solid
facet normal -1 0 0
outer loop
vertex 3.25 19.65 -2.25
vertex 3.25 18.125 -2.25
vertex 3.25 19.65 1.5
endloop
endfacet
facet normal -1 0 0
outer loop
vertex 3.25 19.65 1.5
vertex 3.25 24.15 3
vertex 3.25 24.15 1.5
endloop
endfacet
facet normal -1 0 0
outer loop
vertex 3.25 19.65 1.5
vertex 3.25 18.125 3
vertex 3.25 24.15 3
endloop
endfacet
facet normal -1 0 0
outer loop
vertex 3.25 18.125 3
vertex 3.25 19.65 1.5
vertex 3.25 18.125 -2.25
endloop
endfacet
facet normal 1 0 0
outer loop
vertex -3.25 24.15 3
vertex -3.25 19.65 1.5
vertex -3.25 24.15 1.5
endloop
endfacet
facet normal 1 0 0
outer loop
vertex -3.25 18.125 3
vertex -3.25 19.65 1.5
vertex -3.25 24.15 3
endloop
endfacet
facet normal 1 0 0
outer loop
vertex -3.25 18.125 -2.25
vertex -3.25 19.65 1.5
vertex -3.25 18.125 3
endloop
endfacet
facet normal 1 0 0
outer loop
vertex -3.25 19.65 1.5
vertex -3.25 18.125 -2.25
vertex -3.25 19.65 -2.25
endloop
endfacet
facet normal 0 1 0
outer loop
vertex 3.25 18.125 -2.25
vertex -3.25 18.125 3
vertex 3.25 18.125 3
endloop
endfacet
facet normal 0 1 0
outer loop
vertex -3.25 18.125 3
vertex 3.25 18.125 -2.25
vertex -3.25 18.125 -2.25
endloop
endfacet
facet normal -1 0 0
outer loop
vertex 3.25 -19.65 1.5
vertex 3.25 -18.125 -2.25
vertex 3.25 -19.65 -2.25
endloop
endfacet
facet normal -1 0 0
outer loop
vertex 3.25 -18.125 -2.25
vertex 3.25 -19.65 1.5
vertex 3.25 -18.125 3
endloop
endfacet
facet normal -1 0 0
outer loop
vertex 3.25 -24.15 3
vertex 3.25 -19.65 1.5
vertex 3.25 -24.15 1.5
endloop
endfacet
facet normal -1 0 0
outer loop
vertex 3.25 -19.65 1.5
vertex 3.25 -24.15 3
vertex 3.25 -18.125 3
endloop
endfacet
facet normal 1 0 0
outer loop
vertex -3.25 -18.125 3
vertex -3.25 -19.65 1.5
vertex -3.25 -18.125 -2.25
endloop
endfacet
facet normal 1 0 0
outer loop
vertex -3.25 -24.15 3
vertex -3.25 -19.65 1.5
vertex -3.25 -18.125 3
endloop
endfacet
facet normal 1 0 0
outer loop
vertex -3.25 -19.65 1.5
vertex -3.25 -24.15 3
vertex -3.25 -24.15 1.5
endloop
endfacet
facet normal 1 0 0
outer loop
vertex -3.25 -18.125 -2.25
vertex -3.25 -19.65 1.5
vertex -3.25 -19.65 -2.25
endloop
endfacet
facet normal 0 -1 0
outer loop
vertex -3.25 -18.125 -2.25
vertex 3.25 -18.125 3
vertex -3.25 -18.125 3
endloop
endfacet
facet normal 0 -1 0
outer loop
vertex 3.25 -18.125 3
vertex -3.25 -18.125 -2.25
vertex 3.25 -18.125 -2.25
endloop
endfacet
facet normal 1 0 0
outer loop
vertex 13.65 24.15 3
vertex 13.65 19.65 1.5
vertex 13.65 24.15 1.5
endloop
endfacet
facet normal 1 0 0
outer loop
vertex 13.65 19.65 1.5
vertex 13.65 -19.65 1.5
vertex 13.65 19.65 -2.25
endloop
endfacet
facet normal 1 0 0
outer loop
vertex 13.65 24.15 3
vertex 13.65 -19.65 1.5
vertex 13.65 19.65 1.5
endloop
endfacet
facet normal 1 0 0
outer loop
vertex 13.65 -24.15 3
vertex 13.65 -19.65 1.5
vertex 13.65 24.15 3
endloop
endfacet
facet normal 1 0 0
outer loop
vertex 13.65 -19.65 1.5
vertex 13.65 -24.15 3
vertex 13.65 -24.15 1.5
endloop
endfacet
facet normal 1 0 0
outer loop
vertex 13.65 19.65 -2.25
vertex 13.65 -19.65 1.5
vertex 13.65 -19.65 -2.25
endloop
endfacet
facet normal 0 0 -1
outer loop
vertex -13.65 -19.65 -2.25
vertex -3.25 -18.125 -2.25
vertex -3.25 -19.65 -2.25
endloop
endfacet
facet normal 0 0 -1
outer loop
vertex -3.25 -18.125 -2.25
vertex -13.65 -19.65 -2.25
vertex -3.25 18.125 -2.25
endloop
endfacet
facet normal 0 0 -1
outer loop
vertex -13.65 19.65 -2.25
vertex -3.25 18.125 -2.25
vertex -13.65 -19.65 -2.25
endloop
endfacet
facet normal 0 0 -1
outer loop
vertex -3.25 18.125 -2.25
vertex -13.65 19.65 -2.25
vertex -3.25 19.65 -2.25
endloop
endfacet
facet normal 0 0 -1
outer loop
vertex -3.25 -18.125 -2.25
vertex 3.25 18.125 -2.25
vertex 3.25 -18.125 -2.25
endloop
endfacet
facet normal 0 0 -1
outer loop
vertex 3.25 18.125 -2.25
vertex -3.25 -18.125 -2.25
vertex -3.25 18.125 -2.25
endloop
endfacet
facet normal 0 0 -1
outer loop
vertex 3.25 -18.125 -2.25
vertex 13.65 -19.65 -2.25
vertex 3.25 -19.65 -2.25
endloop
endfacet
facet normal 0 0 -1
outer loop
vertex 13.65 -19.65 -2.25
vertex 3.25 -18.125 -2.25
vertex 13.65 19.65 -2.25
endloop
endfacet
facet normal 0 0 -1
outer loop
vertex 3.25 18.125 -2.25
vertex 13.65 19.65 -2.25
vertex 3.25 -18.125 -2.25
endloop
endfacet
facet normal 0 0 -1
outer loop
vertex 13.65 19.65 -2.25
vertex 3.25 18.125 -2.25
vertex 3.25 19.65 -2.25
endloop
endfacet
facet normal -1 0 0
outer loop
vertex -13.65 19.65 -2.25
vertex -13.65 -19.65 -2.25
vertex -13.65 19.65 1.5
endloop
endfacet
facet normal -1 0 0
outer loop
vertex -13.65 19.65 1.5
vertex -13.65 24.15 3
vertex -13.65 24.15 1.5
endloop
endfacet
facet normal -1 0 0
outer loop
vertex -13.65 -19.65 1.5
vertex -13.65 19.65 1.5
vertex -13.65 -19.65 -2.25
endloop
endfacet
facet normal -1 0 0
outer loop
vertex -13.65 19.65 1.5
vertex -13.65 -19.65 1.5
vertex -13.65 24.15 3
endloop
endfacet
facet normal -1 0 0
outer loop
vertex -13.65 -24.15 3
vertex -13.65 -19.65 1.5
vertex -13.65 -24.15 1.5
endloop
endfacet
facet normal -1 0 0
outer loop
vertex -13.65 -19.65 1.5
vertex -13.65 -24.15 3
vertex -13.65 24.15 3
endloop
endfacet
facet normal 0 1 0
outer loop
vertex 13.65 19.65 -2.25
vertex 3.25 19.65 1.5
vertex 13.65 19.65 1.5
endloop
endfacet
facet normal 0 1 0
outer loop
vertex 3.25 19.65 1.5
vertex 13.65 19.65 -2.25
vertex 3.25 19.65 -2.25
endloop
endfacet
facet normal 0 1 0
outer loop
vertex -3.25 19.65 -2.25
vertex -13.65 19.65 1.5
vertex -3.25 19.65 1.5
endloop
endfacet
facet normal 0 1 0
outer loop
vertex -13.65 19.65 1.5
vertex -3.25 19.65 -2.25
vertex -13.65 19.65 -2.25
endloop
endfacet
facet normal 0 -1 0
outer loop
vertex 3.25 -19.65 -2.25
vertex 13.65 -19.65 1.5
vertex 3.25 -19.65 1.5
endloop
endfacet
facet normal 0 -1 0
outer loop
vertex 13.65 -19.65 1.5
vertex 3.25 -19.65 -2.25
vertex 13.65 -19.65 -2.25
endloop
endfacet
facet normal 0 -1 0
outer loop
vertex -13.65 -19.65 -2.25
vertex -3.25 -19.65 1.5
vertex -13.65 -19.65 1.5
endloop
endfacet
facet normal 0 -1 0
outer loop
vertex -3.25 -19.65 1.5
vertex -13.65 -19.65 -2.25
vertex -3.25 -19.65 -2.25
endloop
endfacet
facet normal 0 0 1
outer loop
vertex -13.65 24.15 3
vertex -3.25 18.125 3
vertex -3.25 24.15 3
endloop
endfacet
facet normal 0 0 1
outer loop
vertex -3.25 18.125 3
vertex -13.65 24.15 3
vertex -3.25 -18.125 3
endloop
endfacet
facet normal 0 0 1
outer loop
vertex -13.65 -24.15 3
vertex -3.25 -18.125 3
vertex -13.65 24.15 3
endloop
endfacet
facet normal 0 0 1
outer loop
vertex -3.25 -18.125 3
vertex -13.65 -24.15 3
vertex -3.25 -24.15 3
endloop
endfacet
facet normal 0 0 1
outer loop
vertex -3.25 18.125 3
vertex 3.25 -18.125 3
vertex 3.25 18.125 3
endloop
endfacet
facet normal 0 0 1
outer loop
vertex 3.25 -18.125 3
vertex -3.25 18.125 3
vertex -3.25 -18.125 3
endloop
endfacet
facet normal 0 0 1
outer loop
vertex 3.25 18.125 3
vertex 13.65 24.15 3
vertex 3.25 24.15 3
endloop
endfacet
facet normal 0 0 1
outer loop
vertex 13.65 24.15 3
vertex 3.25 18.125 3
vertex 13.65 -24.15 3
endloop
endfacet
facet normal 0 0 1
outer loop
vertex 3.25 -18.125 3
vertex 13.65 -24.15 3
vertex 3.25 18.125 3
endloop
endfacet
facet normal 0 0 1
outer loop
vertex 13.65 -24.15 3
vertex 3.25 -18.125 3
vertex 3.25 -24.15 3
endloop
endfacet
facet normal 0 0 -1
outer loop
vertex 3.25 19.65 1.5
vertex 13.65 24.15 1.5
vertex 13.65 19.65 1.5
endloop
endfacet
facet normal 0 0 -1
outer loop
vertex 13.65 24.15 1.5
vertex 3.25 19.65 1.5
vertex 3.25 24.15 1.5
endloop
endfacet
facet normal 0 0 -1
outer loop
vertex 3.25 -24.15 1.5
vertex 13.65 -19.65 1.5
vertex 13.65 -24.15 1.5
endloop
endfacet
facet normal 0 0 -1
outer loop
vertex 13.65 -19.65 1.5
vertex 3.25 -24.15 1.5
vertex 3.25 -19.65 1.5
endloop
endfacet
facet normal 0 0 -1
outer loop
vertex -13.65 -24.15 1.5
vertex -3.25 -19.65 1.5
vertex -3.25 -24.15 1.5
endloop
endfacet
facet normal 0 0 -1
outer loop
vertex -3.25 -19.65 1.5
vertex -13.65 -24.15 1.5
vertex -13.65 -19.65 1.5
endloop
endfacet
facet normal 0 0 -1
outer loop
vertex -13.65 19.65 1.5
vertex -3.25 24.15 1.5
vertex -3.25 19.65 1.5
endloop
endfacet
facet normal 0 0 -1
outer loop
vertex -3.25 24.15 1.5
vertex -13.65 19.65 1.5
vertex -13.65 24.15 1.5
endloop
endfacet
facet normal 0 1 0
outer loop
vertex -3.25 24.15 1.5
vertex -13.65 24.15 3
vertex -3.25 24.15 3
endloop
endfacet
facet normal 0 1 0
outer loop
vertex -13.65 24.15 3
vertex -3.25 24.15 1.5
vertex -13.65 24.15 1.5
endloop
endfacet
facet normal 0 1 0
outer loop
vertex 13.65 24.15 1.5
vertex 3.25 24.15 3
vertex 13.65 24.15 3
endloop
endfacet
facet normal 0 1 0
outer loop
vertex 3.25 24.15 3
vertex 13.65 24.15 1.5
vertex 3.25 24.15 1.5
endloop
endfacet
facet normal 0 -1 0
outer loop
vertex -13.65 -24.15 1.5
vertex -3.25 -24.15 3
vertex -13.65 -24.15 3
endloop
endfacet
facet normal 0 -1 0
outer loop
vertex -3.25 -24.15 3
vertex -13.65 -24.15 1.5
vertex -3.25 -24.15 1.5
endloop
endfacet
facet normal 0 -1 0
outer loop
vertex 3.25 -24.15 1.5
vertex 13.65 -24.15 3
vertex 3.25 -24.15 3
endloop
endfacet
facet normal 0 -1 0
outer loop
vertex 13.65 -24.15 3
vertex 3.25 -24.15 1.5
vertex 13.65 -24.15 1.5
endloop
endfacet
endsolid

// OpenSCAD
wall_thick = 4;  

//vars for recep
tab_ratio=0.75;
tab_ratioi=1-tab_ratio;
tab_multi=3;

recep_width = 27.3;
recep_notch_width=6.5;
recep_notch_height=1.5;
recep_height=39.3;
hole_sep=36;
hole_dia=3;
z_fite=0.05;

recep_thick=wall_thick*1.5;

union() {
  difference() {
    cube([recep_width, recep_height,recep_thick*tab_ratio],center=true);
    union() {
      translate([0,recep_height/2-recep_notch_height/2,0]) cube([recep_notch_width, recep_notch_height+z_fite, recep_thick*tab_ratio+z_fite], center=true);

      translate([0,-recep_height/2+recep_notch_height/2,0]) cube([recep_notch_width, recep_notch_height+z_fite, recep_thick*tab_ratio+z_fite], center=true);
    }
  }

  translate([0,0,(recep_thick*tab_ratio)/2]) 
  difference() {
    cube([recep_width, recep_height+tab_multi*recep_notch_height*2,recep_thick*tab_ratioi],center=true);
    union() {
      translate([0,recep_height/2-recep_notch_height/2+recep_notch_height*tab_multi/2,0]) cube([recep_notch_width, recep_notch_height+tab_multi*recep_notch_height+z_fite, recep_thick*tab_ratioi+z_fite], center=true);

      translate([0,-recep_height/2+recep_notch_height/2-recep_notch_height*tab_multi/2,0]) cube([recep_notch_width, recep_notch_height+tab_multi*recep_notch_height+z_fite, recep_thick*tab_ratioi+z_fite], center=true);
    }
  }
}
